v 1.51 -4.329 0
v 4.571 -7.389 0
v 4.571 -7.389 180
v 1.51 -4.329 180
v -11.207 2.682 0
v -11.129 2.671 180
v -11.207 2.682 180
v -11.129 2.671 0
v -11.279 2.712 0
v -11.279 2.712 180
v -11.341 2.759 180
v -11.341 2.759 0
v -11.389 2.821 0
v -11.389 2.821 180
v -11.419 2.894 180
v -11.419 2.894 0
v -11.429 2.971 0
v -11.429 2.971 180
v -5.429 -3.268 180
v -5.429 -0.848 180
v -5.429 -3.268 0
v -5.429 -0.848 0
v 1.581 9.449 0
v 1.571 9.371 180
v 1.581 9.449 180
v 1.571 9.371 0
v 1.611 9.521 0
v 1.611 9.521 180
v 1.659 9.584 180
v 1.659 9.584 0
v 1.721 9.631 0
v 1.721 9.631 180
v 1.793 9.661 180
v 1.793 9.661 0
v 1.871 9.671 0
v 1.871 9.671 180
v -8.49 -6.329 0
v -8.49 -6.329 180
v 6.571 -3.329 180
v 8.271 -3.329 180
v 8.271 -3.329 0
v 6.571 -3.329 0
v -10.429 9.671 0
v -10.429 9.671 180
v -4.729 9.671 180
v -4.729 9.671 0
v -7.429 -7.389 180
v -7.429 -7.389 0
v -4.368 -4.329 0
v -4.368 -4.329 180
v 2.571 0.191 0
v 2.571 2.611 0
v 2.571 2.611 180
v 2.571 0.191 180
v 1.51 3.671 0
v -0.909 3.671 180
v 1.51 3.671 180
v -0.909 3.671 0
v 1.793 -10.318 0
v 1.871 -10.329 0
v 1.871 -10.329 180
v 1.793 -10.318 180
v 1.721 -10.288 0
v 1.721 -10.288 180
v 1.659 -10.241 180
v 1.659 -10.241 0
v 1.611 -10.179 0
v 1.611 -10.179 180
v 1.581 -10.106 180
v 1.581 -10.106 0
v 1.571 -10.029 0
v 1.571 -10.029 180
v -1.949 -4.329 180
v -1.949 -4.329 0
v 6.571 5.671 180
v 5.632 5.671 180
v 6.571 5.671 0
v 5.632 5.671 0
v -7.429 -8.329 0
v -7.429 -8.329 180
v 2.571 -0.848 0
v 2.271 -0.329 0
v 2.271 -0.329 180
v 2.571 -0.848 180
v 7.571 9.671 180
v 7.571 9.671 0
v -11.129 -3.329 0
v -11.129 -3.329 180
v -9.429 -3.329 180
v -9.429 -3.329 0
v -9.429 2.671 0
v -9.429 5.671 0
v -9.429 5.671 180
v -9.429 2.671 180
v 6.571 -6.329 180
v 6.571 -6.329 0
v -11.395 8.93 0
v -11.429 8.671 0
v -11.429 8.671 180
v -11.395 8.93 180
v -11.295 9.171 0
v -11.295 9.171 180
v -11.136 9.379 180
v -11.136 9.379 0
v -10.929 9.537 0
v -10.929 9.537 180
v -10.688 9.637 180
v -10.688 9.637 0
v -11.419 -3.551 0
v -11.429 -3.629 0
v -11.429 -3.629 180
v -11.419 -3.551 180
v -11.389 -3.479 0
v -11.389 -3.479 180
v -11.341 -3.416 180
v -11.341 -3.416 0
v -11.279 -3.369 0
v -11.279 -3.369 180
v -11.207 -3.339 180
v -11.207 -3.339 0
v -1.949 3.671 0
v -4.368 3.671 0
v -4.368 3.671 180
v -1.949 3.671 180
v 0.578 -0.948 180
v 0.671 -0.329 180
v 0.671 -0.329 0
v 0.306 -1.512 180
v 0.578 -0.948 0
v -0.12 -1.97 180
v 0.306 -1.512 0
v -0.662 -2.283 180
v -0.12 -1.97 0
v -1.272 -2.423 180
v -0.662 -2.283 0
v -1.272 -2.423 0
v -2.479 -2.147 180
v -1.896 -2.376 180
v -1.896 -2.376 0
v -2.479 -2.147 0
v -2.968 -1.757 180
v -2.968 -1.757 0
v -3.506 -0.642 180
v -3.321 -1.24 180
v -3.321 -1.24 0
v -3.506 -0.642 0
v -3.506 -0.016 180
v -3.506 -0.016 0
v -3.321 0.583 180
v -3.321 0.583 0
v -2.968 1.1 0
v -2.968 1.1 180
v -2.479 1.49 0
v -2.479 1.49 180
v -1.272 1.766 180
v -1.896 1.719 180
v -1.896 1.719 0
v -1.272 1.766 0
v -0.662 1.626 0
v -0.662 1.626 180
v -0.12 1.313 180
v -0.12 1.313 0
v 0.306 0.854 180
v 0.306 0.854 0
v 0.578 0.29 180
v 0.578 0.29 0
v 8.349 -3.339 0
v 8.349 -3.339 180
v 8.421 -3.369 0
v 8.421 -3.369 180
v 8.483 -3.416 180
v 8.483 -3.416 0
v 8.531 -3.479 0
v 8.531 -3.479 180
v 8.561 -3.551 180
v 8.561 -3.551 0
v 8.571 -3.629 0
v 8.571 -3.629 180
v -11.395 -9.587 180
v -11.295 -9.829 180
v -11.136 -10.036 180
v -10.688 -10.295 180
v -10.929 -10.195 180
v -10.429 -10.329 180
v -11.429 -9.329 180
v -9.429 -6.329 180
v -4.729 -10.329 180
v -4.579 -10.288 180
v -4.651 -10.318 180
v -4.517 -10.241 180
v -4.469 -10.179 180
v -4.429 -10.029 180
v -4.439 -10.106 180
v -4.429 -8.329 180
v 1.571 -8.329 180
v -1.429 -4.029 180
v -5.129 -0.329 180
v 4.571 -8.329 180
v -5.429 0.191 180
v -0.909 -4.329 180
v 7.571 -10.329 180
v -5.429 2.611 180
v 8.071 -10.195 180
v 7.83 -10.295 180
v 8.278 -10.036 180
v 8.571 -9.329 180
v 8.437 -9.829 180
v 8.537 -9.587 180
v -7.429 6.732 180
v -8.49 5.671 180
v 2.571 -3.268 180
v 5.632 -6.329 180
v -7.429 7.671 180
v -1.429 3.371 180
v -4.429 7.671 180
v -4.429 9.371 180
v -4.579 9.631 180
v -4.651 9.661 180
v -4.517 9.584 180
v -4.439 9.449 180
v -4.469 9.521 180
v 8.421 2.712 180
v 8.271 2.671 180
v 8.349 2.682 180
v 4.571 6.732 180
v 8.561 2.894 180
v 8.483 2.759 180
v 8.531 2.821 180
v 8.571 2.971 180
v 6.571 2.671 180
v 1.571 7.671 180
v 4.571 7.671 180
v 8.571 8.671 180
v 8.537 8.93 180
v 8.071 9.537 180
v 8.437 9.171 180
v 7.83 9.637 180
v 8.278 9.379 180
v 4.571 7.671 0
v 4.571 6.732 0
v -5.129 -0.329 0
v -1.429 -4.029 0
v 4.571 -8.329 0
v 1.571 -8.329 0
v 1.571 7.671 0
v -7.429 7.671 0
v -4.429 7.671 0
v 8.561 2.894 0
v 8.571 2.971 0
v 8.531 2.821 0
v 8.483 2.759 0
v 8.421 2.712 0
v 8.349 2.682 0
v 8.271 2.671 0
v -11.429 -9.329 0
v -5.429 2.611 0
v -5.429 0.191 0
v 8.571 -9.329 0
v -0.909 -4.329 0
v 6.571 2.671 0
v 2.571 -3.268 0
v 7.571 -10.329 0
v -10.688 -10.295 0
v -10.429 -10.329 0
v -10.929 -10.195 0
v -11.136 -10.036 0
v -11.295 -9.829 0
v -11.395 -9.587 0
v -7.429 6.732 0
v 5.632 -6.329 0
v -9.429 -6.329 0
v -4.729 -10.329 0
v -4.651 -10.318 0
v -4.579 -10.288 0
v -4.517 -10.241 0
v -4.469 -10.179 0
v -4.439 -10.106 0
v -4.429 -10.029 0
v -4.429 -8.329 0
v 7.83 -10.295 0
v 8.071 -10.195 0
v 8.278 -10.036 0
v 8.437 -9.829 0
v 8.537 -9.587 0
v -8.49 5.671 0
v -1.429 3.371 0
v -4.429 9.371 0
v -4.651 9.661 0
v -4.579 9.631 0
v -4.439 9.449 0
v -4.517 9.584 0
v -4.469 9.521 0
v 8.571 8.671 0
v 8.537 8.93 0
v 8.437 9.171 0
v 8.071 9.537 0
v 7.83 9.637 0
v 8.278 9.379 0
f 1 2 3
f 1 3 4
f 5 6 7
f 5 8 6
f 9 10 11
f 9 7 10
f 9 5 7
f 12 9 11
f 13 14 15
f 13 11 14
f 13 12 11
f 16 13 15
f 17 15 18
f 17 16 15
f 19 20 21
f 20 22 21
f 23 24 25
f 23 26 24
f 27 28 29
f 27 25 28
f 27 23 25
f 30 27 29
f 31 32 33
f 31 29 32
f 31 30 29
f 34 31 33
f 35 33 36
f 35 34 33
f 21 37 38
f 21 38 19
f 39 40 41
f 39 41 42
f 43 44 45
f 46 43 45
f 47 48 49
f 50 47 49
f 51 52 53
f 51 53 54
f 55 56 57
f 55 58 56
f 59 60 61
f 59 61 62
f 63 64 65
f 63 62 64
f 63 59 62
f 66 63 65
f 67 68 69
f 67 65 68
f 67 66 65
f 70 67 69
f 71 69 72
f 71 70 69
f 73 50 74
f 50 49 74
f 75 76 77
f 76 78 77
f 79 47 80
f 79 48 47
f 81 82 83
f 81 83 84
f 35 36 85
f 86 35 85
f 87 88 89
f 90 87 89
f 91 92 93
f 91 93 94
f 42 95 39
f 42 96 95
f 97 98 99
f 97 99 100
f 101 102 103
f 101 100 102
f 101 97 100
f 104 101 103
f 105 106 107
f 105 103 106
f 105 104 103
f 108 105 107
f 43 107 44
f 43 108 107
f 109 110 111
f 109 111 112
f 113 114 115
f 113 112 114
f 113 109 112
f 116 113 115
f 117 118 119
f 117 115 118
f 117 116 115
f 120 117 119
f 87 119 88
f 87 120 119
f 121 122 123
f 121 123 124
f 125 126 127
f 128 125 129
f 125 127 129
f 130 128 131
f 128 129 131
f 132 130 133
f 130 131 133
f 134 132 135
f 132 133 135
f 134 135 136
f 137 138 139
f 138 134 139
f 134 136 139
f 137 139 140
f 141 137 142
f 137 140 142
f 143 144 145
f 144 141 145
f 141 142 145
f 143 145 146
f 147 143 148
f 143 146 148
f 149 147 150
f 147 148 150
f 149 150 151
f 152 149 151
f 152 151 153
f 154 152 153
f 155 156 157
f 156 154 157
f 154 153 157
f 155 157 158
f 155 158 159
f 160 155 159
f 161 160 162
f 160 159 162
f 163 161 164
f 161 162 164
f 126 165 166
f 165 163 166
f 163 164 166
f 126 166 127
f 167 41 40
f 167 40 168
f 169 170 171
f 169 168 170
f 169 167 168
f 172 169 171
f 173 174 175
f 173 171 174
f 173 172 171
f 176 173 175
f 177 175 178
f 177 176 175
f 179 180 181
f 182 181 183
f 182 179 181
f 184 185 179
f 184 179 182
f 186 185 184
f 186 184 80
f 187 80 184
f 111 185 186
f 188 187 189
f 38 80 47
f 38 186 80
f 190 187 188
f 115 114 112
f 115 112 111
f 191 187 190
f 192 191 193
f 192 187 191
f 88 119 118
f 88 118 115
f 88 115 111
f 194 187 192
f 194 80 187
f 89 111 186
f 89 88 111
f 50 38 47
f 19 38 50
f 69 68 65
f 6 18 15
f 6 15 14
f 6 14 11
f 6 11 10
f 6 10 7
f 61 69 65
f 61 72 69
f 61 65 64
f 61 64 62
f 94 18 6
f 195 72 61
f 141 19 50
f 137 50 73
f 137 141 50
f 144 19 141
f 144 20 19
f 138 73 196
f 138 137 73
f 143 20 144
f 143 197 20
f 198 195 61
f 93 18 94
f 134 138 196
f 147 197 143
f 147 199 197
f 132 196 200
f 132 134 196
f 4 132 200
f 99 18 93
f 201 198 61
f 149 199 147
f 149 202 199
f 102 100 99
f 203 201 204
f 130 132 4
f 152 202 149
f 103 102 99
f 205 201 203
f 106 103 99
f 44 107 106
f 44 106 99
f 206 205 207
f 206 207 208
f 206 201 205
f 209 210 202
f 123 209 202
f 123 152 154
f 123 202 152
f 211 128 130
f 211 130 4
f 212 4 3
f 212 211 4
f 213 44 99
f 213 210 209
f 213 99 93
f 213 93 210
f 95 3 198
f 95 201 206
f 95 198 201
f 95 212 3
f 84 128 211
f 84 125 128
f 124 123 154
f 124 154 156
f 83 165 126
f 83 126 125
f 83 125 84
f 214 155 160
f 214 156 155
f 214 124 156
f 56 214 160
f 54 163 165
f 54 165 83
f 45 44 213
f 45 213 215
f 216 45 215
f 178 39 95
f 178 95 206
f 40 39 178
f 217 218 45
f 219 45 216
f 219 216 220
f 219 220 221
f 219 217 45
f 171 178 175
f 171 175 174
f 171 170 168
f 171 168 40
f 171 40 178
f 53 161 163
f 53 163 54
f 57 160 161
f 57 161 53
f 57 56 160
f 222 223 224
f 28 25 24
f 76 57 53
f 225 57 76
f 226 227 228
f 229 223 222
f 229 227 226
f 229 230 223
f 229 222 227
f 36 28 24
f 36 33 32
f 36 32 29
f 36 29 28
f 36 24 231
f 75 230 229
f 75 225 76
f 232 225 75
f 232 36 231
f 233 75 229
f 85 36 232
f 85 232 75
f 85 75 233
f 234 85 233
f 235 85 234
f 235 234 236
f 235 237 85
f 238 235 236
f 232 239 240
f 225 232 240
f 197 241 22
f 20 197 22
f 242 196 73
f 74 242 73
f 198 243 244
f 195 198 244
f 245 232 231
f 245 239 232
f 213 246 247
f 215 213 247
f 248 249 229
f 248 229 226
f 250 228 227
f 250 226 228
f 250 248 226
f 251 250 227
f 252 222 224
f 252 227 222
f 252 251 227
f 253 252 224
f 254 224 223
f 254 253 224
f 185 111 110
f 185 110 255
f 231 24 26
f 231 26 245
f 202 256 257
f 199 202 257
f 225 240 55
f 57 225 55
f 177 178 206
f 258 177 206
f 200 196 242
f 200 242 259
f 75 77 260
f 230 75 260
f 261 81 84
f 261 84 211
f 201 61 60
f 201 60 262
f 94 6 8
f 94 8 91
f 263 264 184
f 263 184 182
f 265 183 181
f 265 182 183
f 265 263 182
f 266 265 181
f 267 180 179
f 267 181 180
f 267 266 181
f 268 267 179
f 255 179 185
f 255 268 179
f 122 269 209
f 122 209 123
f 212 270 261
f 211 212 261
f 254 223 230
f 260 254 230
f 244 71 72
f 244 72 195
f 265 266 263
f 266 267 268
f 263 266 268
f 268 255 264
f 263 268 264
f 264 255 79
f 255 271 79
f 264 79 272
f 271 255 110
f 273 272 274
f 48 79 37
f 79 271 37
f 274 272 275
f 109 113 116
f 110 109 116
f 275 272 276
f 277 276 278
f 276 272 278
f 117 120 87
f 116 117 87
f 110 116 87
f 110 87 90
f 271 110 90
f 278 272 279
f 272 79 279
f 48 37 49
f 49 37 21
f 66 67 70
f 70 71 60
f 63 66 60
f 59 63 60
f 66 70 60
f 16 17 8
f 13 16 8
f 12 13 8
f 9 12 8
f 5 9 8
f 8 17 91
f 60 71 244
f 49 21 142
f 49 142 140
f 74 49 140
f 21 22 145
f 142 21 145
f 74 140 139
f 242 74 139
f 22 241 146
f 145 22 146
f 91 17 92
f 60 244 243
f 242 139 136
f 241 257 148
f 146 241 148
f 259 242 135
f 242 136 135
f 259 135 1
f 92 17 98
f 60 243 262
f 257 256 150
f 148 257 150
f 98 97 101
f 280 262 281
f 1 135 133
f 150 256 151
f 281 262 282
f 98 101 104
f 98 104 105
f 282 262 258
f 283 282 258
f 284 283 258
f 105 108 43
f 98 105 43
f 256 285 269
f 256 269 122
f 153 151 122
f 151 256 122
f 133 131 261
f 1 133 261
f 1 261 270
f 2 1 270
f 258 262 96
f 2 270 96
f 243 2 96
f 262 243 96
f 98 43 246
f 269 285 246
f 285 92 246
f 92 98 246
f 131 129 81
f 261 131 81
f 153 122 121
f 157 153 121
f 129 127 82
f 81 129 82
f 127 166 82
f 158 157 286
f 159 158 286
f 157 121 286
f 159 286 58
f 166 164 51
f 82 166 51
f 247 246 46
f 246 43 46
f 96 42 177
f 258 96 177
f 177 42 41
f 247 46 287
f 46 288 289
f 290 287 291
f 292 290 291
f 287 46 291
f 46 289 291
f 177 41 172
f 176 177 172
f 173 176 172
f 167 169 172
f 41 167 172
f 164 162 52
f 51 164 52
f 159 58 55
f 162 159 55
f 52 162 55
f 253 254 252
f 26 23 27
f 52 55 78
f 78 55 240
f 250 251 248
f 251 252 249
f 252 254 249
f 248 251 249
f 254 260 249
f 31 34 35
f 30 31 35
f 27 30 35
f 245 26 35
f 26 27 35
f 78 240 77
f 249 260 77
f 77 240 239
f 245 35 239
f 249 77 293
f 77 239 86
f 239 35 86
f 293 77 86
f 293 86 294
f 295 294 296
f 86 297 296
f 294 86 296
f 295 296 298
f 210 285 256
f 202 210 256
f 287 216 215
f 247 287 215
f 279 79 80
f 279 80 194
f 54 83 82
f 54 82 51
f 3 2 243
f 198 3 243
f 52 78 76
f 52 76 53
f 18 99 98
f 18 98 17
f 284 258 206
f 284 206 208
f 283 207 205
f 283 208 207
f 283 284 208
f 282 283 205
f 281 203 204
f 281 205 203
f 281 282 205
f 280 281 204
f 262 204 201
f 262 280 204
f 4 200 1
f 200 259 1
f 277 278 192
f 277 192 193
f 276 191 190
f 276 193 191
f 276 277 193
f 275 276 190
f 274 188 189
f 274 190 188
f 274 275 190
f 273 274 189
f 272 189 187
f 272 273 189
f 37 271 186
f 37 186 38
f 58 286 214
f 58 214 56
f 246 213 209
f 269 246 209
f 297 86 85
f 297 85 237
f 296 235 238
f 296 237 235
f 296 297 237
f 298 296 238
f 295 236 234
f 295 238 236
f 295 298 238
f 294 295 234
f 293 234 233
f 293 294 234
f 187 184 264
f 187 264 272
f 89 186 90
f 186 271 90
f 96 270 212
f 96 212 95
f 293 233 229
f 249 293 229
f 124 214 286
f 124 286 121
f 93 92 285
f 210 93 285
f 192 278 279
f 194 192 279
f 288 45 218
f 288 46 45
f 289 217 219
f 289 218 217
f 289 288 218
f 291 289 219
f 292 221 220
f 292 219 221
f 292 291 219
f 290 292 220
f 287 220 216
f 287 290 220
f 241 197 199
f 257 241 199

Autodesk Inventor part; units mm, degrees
ref_plane "YZ Plane" through (0, 0, 0) normal (1, 0, 0) x (0, 1, 0)
ref_plane "XZ Plane" through (0, 0, 0) normal (0, 1, 0) x (-1, 0, 0)
ref_plane "XY Plane" through (0, 0, 0) normal (0, 0, 1) x (1, 0, 0)
sketch "Sketch1" plane through (0, 0, 0) normal (0, 0, 1) x (1, 0, 0)
  line L0 (-13.429, -0.3286) -> (10.571, -0.3286)
  line L1 (-1.429, 11.6714) -> (-1.429, -12.3286)
  line L2 (5.6317, 5.6714) -> (2.571, 2.6107)
  line L3 (6.571, 5.6714) -> (6.571, 2.6714)
  line L4 (4.571, 6.7321) -> (1.5103, 3.6714)
  line L5 (-9.429, 5.6714) -> (-9.429, 2.6714)
  line L6 (-8.4897, 5.6714) -> (-5.429, 2.6107)
  line L7 (-7.429, 6.732) -> (-4.3683, 3.6714)
  line L8 (8.571, 8.6714) -> (8.571, 2.9714)
  line L9 (-11.429, 8.6714) -> (-11.429, 2.9714)
  line L10 (5.6317, -6.3286) -> (2.571, -3.2679)
  line L11 (1.871, -10.3286) -> (7.571, -10.3286)
  line L12 (-8.4897, -6.3286) -> (-5.429, -3.2679)
  line L13 (-7.429, -8.3286) -> (-4.429, -8.3286)
  line L14 (-7.429, -7.3893) -> (-4.3683, -4.3286)
  line L15 (-10.429, -10.3286) -> (-4.729, -10.3286)
  arc A0 (-11.129, -3.3286) -> (-11.429, -3.6286) centre (-11.129, -3.6286) ccw
  line L16 (-9.429, -6.3286) -> (-9.429, -3.3286)
  line L17 (-7.429, -7.3893) -> (-7.429, -8.3286)
  line L18 (-11.429, -3.6286) -> (-11.429, -9.3286)
  arc A1 (-11.429, -9.3286) -> (-10.429, -10.3286) centre (-10.429, -9.3286) ccw
  line L19 (-9.004, -10.3286) -> (-9.004, -10.3285)
  line L20 (-9.429, -6.3286) -> (-8.4897, -6.3286)
  line L21 (-11.129, -3.3286) -> (-9.429, -3.3286)
  line L22 (-11.129, 2.6714) -> (-9.429, 2.6714)
  arc A2 (-11.429, 2.9714) -> (-11.129, 2.6714) centre (-11.129, 2.9714) ccw
  arc A3 (-4.729, -10.3286) -> (-4.429, -10.0286) centre (-4.729, -10.0286) ccw
  line L23 (-4.429, -10.0286) -> (-4.429, -8.3286)
  line L24 (4.571, -7.3893) -> (4.571, -8.3286)
  line L25 (4.571, -8.3286) -> (1.571, -8.3286)
  arc A4 (1.571, -10.0286) -> (1.871, -10.3286) centre (1.871, -10.0286) ccw
  line L26 (1.571, -10.0286) -> (1.571, -8.3286)
  line L27 (4.571, -7.3893) -> (1.5103, -4.3286)
  circle A5 centre (-1.429, -0.3286) radius 2.1
  arc A6 (8.571, -3.6286) -> (8.271, -3.3286) centre (8.271, -3.6286) ccw
  line L28 (6.571, -6.3286) -> (6.571, -3.3286)
  line L29 (8.571, -3.6286) -> (8.571, -9.3286)
  arc A7 (7.571, -10.3286) -> (8.571, -9.3286) centre (7.571, -9.3286) ccw
  line L30 (5.6317, -6.3286) -> (6.571, -6.3286)
  line L31 (8.271, -3.3286) -> (6.571, -3.3286)
  line L32 (8.271, 2.6714) -> (6.571, 2.6714)
  arc A8 (8.271, 2.6714) -> (8.571, 2.9714) centre (8.271, 2.9714) ccw
  line L33 (1.871, 9.6714) -> (7.571, 9.6714)
  line L34 (-10.429, 9.6714) -> (-4.729, 9.6714)
  arc A9 (-4.429, 9.3714) -> (-4.729, 9.6714) centre (-4.729, 9.3714) ccw
  line L35 (-7.429, 7.6714) -> (-4.429, 7.6714)
  arc A10 (-10.429, 9.6714) -> (-11.429, 8.6714) centre (-10.429, 8.6714) ccw
  line L36 (-9.429, 5.6714) -> (-8.4897, 5.6714)
  line L37 (-7.429, 7.6714) -> (-7.429, 6.732)
  line L38 (-4.429, 9.3714) -> (-4.429, 7.6714)
  line L39 (1.571, 9.3714) -> (1.571, 7.6714)
  line L40 (4.571, 7.6714) -> (1.571, 7.6714)
  line L41 (4.571, 7.6714) -> (4.571, 6.7321)
  arc A11 (1.871, 9.6714) -> (1.571, 9.3714) centre (1.871, 9.3714) ccw
  arc A12 (8.571, 8.6714) -> (7.571, 9.6714) centre (7.571, 8.6714) ccw
  line L42 (5.6317, 5.6714) -> (6.571, 5.6714)
  line L43 (-5.429, 2.6107) -> (-5.429, 0.191)
  line L44 (2.571, 2.6107) -> (2.571, 0.191)
  line L45 (-4.3683, 3.6714) -> (-1.9486, 3.6714)
  line L46 (-4.3683, -4.3286) -> (-1.9486, -4.3286)
  line L47 (-1.429, 3.3714) -> (-1.9486, 3.6714)
  line L48 (-1.429, 3.3714) -> (-0.9094, 3.6714)
  line L49 (-0.9094, 3.6714) -> (1.5103, 3.6714)
  line L50 (-5.129, -0.3286) -> (-5.429, -0.8482)
  line L51 (-5.129, -0.3286) -> (-5.429, 0.191)
  line L52 (-1.429, -4.0286) -> (-0.9094, -4.3286)
  line L53 (-1.429, -4.0286) -> (-1.9486, -4.3286)
  line L54 (2.271, -0.3286) -> (2.571, 0.191)
  line L55 (2.271, -0.3286) -> (2.571, -0.8482)
  line L56 (2.571, -0.8482) -> (2.571, -3.2679)
  line L57 (-0.9094, -4.3286) -> (1.5103, -4.3286)
  line L58 (-5.429, -0.8482) -> (-5.429, -3.2679)
  point P0 (2.271, -0.3286)
  point P1 (5.6317, 5.6714)
  point P2 (8.271, 2.6714)
  point P3 (8.571, 2.9714)
  point P4 (1.871, 9.6714)
  point P5 (1.571, 9.3714)
  point P6 (-1.429, 3.3714)
  point P7 (-4.429, 9.3714)
  point P8 (-11.429, 2.9714)
  point P9 (-11.129, 2.6714)
  point P10 (-8.4897, 5.6714)
  point P11 (-5.129, -0.3286)
  point P12 (-8.4897, -6.3286)
  point P13 (-11.129, -3.3286)
  point P14 (-11.429, -3.6286)
  point P15 (-4.729, -10.3286)
  point P16 (-4.429, -10.0286)
  point P17 (-7.429, -7.3893)
  point P18 (-1.429, -4.0286)
  point P19 (4.571, -7.3893)
  point P20 (1.571, -10.0286)
  point P21 (1.871, -10.3286)
  point P22 (8.571, -3.6286)
  point P23 (8.271, -3.3286)
  point P24 (5.6317, -6.3286)
  dimension "d0" = 20
  dimension "d1" = 20
extrude "Extrusion1" add sketch "Sketch1" along normal blind 180 contours A5 L1 L48 L49 L4 L41 L40 L39 A11 L33 A12 L8 A8 L32 L3 L42 L2 L44 L54 L0 | L0 L55 L56 L10 L30 L28 L31 A6 L29 A7 L11 A4 L26 L25 L24 L27 L57 L52 L1 A5 | A5 L0 L51 L43 L6 L36 L5 L22 A2 L9 A10 L34 A9 L38 L35 L37 L7 L45 L47 L1 | L1 L53 L46 L14 L17 L13 L23 A3 L15 A1 L18 A0 L21 L16 L20 L12 L58 L50 L0 A5
properties part number "20x20_180mm"
